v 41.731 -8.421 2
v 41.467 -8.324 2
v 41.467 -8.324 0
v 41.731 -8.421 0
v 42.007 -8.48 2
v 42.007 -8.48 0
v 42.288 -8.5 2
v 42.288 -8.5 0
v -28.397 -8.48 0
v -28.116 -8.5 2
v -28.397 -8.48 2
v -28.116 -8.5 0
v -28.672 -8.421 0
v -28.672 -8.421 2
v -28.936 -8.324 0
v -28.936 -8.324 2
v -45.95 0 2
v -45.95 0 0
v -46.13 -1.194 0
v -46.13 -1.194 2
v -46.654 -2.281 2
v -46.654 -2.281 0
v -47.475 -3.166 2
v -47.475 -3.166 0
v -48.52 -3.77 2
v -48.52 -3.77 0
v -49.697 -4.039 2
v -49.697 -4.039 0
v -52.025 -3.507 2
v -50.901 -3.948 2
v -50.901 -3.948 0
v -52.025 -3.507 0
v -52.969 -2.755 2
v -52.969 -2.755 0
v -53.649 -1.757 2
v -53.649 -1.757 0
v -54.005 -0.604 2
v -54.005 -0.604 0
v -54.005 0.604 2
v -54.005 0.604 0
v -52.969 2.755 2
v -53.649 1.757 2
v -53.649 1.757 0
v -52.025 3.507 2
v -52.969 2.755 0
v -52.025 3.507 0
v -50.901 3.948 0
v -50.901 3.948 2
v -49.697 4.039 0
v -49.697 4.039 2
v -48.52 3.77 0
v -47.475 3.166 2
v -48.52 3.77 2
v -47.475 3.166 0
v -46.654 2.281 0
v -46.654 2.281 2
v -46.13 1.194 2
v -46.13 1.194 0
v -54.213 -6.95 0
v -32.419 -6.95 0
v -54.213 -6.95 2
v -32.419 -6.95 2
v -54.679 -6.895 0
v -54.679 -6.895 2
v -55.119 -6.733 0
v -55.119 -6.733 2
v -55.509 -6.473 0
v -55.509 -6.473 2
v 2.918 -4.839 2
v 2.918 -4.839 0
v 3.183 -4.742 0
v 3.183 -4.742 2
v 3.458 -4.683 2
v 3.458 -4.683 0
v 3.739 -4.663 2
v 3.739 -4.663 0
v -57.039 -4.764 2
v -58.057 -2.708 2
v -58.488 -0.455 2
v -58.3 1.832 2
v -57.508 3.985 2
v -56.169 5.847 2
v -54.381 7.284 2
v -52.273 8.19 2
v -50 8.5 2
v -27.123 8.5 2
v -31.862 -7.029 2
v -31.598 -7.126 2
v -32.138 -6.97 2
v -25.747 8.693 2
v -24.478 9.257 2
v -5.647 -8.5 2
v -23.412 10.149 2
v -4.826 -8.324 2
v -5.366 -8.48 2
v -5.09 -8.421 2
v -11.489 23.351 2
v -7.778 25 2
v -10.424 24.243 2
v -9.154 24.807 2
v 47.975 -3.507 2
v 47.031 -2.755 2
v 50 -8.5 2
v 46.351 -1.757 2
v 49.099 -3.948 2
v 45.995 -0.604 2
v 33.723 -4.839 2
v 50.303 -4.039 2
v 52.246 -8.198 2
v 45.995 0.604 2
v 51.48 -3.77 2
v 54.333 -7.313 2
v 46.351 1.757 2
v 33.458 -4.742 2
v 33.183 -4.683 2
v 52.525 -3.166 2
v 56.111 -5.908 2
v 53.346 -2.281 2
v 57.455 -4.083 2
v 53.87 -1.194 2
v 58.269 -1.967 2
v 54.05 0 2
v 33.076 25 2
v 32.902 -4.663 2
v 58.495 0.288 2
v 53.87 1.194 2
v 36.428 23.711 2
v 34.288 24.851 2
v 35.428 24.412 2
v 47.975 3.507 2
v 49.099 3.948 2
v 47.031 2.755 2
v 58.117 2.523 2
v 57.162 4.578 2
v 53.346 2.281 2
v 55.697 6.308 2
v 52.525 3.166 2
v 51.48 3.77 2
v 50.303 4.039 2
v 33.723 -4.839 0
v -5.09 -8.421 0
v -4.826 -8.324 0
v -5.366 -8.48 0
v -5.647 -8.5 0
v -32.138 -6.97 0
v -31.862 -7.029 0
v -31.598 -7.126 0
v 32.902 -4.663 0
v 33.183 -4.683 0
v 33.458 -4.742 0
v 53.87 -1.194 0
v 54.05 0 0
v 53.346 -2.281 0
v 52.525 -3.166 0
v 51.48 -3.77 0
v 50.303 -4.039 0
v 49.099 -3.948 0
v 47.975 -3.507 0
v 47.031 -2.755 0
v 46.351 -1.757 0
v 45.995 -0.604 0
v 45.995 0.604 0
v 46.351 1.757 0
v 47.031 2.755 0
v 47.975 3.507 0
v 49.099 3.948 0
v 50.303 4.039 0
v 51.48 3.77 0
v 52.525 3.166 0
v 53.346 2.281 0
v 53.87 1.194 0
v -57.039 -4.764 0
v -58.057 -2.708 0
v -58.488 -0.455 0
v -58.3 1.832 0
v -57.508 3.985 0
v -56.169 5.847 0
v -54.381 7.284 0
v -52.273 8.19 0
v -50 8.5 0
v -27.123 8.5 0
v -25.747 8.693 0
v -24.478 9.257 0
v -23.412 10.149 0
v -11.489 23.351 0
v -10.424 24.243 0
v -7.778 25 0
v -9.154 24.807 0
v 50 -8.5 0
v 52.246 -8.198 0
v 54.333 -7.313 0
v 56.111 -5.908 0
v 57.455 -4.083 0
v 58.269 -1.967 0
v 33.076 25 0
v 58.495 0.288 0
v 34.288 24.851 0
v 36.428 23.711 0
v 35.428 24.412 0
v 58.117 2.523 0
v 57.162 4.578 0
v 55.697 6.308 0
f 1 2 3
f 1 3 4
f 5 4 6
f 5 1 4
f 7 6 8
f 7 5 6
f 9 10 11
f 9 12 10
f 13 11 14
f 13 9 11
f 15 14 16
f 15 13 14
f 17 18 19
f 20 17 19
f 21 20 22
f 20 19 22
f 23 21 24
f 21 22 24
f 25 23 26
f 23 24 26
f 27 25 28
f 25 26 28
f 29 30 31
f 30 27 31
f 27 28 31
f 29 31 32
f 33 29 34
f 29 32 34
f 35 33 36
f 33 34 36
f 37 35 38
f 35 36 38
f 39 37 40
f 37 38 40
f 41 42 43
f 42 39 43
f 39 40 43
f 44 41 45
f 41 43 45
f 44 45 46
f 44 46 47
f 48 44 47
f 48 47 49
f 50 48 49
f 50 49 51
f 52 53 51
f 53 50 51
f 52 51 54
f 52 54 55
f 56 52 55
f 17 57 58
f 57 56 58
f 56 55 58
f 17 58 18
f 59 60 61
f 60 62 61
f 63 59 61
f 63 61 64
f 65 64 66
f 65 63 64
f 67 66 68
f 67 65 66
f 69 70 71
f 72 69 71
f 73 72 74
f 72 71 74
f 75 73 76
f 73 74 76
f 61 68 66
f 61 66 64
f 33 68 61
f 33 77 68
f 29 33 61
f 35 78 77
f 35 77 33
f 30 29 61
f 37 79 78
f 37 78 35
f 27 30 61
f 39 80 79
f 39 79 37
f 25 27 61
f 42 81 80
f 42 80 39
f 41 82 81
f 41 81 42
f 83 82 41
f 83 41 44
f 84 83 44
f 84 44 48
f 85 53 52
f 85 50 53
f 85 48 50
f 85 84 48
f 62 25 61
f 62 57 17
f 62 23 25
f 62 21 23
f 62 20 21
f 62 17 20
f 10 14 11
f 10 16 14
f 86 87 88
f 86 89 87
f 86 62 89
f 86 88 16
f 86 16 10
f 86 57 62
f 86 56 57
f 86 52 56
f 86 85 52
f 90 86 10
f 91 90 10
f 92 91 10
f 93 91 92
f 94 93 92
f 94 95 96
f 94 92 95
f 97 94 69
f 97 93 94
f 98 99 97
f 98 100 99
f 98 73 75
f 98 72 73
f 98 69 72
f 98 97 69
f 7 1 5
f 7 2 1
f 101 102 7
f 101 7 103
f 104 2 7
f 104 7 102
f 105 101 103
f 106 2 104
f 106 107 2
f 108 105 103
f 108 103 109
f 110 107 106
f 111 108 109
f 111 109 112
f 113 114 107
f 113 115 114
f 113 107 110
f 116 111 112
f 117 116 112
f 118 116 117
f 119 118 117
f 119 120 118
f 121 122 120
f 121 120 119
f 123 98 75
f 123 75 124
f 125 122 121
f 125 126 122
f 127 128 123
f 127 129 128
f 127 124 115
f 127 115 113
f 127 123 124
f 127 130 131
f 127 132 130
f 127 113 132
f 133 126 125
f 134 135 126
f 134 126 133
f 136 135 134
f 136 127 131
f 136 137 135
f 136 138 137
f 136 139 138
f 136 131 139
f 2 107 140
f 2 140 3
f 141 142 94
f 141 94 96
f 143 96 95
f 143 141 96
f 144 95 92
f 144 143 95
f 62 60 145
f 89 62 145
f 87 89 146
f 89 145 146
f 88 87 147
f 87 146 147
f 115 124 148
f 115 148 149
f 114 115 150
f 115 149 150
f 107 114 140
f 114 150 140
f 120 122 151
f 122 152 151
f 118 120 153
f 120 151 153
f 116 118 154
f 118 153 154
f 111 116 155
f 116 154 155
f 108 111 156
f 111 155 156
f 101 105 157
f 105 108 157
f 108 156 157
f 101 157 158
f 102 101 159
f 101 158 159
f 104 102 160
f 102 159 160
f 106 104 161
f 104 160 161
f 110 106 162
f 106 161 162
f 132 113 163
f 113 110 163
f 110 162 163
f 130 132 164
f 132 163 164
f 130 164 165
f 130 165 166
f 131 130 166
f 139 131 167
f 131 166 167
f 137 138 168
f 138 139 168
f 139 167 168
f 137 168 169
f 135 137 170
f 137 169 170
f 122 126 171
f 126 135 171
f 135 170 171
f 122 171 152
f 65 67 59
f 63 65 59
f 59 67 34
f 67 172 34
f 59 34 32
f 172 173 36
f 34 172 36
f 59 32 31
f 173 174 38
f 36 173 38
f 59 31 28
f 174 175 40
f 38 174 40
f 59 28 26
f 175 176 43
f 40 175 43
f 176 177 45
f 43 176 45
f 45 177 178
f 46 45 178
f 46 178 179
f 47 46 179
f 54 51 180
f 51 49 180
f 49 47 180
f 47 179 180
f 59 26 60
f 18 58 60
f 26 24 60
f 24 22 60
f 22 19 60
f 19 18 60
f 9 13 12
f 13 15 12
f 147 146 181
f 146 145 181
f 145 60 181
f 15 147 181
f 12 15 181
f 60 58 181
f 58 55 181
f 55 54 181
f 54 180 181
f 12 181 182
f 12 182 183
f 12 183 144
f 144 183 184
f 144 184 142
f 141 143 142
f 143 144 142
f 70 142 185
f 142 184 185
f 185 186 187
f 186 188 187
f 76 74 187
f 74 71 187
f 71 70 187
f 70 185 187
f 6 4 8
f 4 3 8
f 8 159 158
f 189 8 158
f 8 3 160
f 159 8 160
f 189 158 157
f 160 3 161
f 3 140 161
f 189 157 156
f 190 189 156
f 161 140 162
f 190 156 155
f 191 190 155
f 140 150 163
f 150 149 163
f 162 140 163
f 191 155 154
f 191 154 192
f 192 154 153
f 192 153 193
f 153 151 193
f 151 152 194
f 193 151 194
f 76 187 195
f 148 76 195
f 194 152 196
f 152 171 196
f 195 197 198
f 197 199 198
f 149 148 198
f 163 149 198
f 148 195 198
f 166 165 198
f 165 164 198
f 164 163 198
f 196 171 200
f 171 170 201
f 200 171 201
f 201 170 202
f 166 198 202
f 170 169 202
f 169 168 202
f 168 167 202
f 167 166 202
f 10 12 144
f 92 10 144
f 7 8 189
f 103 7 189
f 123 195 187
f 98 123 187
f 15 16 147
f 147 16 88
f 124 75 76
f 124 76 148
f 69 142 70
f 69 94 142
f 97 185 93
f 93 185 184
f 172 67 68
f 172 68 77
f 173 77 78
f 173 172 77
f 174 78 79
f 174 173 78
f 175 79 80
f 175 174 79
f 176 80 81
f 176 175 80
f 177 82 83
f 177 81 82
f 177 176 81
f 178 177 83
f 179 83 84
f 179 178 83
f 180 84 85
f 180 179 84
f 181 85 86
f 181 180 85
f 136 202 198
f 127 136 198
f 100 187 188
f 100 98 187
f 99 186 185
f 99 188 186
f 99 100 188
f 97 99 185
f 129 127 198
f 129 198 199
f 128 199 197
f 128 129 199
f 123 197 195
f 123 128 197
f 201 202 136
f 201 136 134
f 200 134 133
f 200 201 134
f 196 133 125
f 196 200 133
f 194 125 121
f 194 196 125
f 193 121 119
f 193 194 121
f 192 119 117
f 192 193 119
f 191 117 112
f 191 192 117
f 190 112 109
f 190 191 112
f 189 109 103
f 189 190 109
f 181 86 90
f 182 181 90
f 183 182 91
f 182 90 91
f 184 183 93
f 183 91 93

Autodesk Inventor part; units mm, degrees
ref_plane "YZ Plane" through (0, 0, 0) normal (1, 0, 0) x (0, 1, 0)
ref_plane "XZ Plane" through (0, 0, 0) normal (0, 1, 0) x (-1, 0, 0)
ref_plane "XY Plane" through (0, 0, 0) normal (0, 0, 1) x (1, 0, 0)
sketch "スケッチ1" plane through (0, 0, 0) normal (0, 0, 1) x (1, 0, 0)
  line L0 (-50, 0) -> (50, 0) construction
  circle A0 centre (-50, 0) radius 4.05
  circle A1 centre (50, 0) radius 4.05
  line L1 (-50, 8.5) -> (50, 8.5)
  line L2 (-50, -8.5) -> (50, -8.5)
  arc A2 (-50, 8.5) -> (-50, -8.5) centre (-50, 0) ccw
  arc A3 (50, -8.5) -> (50, 8.5) centre (50, 0) ccw
  line L3 (55.697, 6.3082) -> (35, 25)
  line L4 (35, 25) -> (-10, 25)
  line L5 (-10, 25) -> (-24.9014, 8.5)
  line L6 (-16.3218, 18) -> (42.751, 18) construction
  line L7 (-10, 25) -> (-10, 18) construction
  line L8 (35, 25) -> (35, 18) construction
  circle A4 centre (32.5, 21.5) radius 1.55
  circle A5 centre (-7.5, 21.5) radius 1.55
  circle A6 centre (12.5, 21.5) radius 1.55
  line L9 (-10, 21.5) -> (35, 21.5) construction
  line L10 (35, 24) -> (-10, 24) construction
  line L11 (-10, 24) -> (-10, 19) construction
  line L12 (-10, 19) -> (35, 19) construction
  line L13 (35, 19) -> (35, 24) construction
  point P0 (0, 0)
  point P1 (0, 0)
  dimension "d0" = 100
  dimension "d1" = 8.1
  dimension "d2" = 8.5
  dimension "d8" = 8.1
  dimension "d10" = 7
  dimension "d11" = 45
  dimension "d12" = 2.5
  dimension "d13" = 3.1
  dimension "d14" = 2.5
  dimension "d15" = 15
  dimension "d17" = 5
  dimension "d18" = 19
extrude "押し出し1" add sketch "スケッチ1" along normal blind 2
fillet "フィレット1" radius 5 3 edges at (-24.9014, 8.5, 1) (-10, 25, 1) (35, 25, 1)
sketch "スケッチ2" plane through (0, 0, 2) normal (0, 0, 1) x (1, 0, 0)
  arc A0 (50, -8.5) -> (55.697, 6.3082) centre (50, 0) ccw projected
  line L0 (18, -20) -> (-35.4549, -20) construction
  line L1 (-76.9607, -11.5) -> (-72, -11.5)
  line L2 (-72, -11.5) -> (-62, -7)
  line L3 (-62, -7) -> (-32, -7)
  line L4 (-32, -7) -> (-22, -11.5)
  line L5 (-22, -11.5) -> (-17.0393, -11.5)
  line L6 (-17.0393, -11.5) -> (-17.0393, -12.4)
  line L7 (-17.0393, -12.4) -> (-76.9607, -12.4)
  line L8 (-76.9607, -12.4) -> (-76.9607, -11.5)
  line L9 (-31.9893, -6.95) -> (-62.0107, -6.95)
  line L10 (-62.0107, -6.95) -> (-72.0107, -11.45)
  line L11 (-72.0107, -11.45) -> (-77.0107, -11.45)
  line L12 (-77.0107, -11.45) -> (-77.0107, -12.45)
  line L13 (-77.0107, -12.45) -> (-16.9893, -12.45)
  line L14 (-16.9893, -12.45) -> (-16.9893, -11.45)
  line L15 (-16.9893, -11.45) -> (-21.9893, -11.45)
  line L16 (-21.9893, -11.45) -> (-31.9893, -6.95)
  circle A1 centre (-50, 0) radius 4.05 projected
  circle A2 centre (-50, 0) radius 5.5 construction
  circle A3 centre (50, 0) radius 4.05 projected
  line L17 (83.3205, -17.7128) -> (50, 0) construction
  line L18 (50, 0) -> (18, -20) construction
  line L19 (83.3205, -17.7128) -> (37.8533, -17.7128) construction
  line L20 (-11.6402, -10.1128) -> (48.2812, -10.1128)
  line L21 (48.2812, -10.1128) -> (48.2812, -9.2128)
  line L22 (48.2812, -9.2128) -> (43.3205, -9.2128)
  line L23 (43.3205, -9.2128) -> (33.3205, -4.7128)
  line L24 (33.3205, -4.7128) -> (3.3205, -4.7128)
  line L25 (3.3205, -4.7128) -> (-6.6795, -9.2128)
  line L26 (-6.6795, -9.2128) -> (-11.6402, -9.2128)
  line L27 (-11.6402, -9.2128) -> (-11.6402, -10.1128)
  line L28 (-6.6902, -9.1628) -> (3.3098, -4.6628)
  line L29 (3.3098, -4.6628) -> (33.3312, -4.6628)
  line L30 (33.3312, -4.6628) -> (43.3312, -9.1628)
  line L31 (43.3312, -9.1628) -> (48.3312, -9.1628)
  line L32 (48.3312, -9.1628) -> (48.3312, -10.1628)
  line L33 (48.3312, -10.1628) -> (-11.6902, -10.1628)
  line L34 (-11.6902, -10.1628) -> (-11.6902, -9.1628)
  line L35 (-11.6902, -9.1628) -> (-6.6902, -9.1628)
  point P0 (0, 0)
  dimension "d19" = 20
  dimension "d20" = 32
  dimension "d21" = 40
  dimension "d22" = 10
  dimension "d23" = 8.5
  dimension "d24" = 10
  dimension "d25" = 30
  dimension "d26" = 13
  dimension "d27" = 0.05
  dimension "d32" = 11
  dimension "d33" = 120
  dimension "d34" = 1
  dimension "d36" = 5
  dimension "d37" = 40
  dimension "d38" = 8.5
  dimension "d39" = 0.05
extrude "押し出し2" cut sketch "スケッチ2" against normal blind 10 contours L1 L2 L3 L4 L5 L6 L7 L8 | L16 L15 L14 L13 L12 L11 L10 L9 | L27 L26 L25 L24 L23 L22 L21 L20 | L28 L29 L30 L31 L32 L33 L34 L35
fillet "フィレット2" radius 2 7 edges at (-28.5448, -8.5, 1) (-31.9893, -6.95, 1) (-5.2173, -8.5, 1) (3.3098, -4.6628, 1) (41.8583, -8.5, 1) (33.3312, -4.6628, 1) (-54.8936, -6.95, 1)
sketch "スケッチ3" plane through (0, 0, 0) normal (0, 0, -1) x (-1, 0, 0)
  circle A0 centre (7.5, 21.5) radius 1.55 projected
  circle A1 centre (7.5, 21.5) radius 1.55
  circle A2 centre (-12.5, 21.5) radius 1.55 projected
  circle A3 centre (-12.5, 21.5) radius 1.55
  circle A4 centre (-32.5, 21.5) radius 1.55 projected
  circle A5 centre (-32.5, 21.5) radius 1.55
  point P0 (0, 0)
extrude "押し出し3" add sketch "スケッチ3" against normal up to surface (2 mm away)
equation "\"d8\" = d1"
equation "\"d14\" = d12"
equation "\"d24\" = d22"
equation "\"d37\" = d21"
equation "\"d38\" = d23"
properties part number "rinnku" material "GFRP"
